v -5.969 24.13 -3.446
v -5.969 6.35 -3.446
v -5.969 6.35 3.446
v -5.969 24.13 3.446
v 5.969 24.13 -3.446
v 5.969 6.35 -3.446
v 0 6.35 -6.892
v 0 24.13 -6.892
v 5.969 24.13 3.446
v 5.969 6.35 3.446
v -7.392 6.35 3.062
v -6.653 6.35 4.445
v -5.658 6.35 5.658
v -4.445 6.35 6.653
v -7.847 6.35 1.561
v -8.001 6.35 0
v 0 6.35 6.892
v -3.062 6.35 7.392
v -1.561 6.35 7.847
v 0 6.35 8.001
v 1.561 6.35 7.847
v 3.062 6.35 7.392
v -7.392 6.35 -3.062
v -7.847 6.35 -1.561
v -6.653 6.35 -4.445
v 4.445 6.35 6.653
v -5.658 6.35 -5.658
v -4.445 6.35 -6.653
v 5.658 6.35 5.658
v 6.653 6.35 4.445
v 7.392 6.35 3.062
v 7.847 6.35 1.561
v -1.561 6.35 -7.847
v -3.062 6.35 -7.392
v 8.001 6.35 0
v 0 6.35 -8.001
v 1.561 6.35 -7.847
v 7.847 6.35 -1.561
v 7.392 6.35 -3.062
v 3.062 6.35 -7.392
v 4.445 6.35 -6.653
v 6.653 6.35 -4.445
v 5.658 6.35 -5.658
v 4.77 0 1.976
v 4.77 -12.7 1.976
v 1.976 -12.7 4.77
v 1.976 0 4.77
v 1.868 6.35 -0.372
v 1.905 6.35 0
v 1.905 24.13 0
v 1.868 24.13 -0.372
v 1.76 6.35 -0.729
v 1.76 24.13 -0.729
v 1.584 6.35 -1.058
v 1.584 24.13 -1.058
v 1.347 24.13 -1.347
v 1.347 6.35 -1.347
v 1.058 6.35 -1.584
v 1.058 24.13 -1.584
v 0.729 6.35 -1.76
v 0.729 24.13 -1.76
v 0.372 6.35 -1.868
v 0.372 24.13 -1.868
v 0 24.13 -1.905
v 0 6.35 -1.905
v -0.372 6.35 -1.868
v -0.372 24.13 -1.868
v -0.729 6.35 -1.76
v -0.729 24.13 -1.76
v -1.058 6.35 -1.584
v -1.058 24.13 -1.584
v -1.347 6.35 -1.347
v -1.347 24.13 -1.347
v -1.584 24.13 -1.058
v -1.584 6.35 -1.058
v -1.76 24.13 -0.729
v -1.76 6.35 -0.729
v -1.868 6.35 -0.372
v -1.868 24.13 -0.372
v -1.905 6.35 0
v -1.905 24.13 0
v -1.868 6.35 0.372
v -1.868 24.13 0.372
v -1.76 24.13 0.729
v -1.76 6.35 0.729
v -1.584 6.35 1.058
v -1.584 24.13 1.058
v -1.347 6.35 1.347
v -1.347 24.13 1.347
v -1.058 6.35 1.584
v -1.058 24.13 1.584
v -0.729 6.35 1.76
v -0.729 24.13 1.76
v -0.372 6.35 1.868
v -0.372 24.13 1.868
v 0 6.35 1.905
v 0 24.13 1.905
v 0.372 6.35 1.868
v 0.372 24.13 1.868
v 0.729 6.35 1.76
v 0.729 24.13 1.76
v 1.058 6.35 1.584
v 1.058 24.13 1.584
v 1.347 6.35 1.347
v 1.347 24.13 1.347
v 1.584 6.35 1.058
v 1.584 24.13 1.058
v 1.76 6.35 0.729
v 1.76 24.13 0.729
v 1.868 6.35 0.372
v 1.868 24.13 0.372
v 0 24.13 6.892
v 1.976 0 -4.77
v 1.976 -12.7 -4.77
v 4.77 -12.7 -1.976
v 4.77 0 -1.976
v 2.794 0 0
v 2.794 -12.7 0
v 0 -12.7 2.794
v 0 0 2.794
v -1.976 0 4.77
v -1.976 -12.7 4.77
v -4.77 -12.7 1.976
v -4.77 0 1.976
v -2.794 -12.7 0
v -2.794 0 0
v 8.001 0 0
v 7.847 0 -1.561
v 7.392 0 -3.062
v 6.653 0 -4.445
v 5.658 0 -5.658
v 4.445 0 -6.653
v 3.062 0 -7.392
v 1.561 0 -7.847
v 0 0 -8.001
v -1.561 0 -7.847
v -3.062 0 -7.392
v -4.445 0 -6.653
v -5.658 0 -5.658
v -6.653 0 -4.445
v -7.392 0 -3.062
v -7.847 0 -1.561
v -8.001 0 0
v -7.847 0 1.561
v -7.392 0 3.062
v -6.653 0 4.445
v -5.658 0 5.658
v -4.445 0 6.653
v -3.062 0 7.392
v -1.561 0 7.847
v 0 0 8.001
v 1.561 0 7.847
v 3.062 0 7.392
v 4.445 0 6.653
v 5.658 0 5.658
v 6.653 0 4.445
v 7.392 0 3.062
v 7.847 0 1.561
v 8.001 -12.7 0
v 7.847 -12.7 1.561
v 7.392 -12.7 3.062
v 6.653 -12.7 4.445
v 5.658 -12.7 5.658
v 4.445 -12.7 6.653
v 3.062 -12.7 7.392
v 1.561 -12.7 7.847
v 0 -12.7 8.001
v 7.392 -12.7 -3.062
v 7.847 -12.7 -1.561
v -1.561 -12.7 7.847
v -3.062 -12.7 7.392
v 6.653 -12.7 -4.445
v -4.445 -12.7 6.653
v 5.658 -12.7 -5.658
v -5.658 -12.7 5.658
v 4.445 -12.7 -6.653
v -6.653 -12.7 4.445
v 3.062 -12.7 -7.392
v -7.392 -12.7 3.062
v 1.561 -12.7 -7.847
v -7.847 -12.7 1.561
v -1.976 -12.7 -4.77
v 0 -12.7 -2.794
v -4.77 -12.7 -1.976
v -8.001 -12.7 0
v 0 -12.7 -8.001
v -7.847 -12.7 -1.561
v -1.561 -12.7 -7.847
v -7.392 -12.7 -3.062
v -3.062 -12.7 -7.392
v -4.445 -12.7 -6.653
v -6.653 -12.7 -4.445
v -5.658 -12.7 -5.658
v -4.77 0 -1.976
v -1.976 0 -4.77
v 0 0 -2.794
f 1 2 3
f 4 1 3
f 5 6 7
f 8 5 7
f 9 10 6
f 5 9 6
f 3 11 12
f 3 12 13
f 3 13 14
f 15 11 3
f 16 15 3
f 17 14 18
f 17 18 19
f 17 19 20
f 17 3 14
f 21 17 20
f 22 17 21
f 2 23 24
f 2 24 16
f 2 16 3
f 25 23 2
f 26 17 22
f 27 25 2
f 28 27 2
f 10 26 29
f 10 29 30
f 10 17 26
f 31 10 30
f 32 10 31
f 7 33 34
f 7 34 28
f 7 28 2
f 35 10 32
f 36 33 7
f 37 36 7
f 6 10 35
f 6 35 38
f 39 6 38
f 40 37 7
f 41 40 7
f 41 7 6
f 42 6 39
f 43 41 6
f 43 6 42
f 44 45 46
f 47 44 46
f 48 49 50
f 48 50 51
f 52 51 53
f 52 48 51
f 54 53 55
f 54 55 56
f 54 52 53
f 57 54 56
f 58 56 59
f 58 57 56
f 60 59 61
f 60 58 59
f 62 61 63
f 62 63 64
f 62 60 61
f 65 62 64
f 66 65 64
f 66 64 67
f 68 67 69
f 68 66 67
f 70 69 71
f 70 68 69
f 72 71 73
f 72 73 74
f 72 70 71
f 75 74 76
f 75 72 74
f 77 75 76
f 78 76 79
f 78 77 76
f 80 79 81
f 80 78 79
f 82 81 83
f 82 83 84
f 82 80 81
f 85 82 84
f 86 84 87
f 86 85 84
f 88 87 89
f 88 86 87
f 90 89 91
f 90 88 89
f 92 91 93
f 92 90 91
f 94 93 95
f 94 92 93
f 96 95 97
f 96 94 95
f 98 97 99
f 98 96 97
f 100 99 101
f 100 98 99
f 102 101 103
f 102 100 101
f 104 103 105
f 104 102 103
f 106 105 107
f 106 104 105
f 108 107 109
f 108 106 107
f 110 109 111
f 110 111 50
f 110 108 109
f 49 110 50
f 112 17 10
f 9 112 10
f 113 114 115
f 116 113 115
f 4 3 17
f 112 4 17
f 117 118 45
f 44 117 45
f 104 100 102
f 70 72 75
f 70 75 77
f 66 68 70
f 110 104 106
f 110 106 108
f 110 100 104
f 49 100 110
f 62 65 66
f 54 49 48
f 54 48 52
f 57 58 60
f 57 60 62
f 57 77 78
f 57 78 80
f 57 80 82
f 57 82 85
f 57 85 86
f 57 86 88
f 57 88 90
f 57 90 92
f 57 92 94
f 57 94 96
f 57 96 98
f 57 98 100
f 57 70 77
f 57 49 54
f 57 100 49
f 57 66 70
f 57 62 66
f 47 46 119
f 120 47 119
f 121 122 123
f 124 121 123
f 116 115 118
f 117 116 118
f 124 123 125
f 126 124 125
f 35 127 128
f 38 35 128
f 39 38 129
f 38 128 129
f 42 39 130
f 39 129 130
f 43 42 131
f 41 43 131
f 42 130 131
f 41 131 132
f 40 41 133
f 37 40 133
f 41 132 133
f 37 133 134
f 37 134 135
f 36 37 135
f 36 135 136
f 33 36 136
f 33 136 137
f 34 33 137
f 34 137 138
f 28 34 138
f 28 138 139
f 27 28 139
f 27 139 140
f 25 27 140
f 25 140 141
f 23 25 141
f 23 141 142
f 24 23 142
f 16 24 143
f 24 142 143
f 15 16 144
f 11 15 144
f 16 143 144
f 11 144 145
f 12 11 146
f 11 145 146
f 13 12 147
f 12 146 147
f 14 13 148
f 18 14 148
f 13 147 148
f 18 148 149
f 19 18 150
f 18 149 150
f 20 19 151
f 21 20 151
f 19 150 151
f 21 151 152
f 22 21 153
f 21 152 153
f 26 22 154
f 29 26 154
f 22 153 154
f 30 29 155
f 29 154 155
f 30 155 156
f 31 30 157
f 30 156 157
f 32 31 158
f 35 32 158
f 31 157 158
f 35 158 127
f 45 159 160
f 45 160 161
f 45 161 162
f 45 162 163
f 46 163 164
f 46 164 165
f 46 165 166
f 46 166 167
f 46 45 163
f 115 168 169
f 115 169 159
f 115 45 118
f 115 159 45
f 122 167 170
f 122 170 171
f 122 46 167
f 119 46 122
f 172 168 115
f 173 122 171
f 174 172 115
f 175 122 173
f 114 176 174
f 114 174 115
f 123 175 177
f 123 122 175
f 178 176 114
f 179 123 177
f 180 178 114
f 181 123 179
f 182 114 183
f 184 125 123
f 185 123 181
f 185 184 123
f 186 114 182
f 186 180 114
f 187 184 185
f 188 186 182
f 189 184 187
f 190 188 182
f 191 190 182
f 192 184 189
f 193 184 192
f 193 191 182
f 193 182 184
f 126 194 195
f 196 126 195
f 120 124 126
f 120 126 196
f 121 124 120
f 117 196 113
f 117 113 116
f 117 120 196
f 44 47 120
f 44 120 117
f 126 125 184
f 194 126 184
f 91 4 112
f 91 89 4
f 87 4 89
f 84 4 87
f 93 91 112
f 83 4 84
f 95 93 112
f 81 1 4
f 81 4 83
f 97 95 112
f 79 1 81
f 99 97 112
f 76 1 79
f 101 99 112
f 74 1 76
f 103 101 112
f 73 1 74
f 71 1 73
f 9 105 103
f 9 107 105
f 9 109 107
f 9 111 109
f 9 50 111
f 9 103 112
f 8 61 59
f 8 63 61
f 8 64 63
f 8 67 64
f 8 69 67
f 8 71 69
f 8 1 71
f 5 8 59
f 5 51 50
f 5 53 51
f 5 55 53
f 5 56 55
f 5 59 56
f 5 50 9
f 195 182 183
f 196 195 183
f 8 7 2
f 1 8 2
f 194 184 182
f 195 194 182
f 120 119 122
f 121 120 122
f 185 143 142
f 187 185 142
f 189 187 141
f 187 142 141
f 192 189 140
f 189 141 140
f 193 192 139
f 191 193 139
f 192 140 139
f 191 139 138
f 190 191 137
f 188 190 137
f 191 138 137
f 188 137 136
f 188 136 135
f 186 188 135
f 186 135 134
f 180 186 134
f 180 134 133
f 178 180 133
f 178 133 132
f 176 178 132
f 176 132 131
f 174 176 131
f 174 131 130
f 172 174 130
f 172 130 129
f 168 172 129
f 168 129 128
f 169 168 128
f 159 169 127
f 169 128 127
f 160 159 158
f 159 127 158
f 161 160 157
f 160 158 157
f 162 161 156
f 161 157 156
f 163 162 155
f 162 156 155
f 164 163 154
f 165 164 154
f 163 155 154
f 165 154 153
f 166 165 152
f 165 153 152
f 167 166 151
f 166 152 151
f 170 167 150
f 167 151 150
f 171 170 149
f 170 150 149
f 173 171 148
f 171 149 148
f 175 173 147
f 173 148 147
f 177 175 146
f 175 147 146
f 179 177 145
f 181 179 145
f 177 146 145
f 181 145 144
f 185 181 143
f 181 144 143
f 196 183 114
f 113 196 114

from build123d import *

# Parameters (mm, degrees)
SKETCH1_R           = 8.001
BOSS_EXTRUDE1_DEPTH = 6.35
SKETCH3_R           = 8.001
BOSS_EXTRUDE2_DEPTH = 12.7
CUT_EXTRUDE1_DEPTH  = 12.7
SKETCH11_R          = 1.905
BOSS_EXTRUDE5_DEPTH = 17.78


with BuildPart() as part:
    # Sketch1 → Boss-Extrude1 (new body)
    with BuildSketch(Plane(origin=(0, 0, 0), x_dir=(1, 0, 0), z_dir=(0, 1, 0))):
        Circle(SKETCH1_R)
    extrude(amount=BOSS_EXTRUDE1_DEPTH)

    # Sketch3 → Boss-Extrude2 (add)
    with BuildSketch(Plane(origin=(0, 0, 0), x_dir=(-1, 0, 0), z_dir=(0, -1, 0))):
        Circle(SKETCH3_R)
    extrude(amount=BOSS_EXTRUDE2_DEPTH)

    # Sketch4 → Cut-Extrude1 (cut)
    with BuildSketch(Plane.XZ.offset(12.7)):
        Polygon((8.54e-07, 2.793990901), (-1.975654462, 4.769648278), (-4.769655316, 1.975649132), (-2.794, -8.246e-06), (-4.769655493, -1.975665446), (-1.97565137, -4.769661323), (0, -2.794), (1.975656347, -4.769656347), (4.769656347, -1.975656347), (2.794, 0), (4.76965137, 1.975661323), (1.975647247, 4.7696572), align=None)
    extrude(amount=-CUT_EXTRUDE1_DEPTH, mode=Mode.SUBTRACT)

    # Sketch11 → Boss-Extrude5 (add)
    with BuildSketch(Plane(origin=(0, 6.35, 0), x_dir=(1, 0, 0), z_dir=(0, 1, 0))):
        Polygon((0, 6.892407514), (-5.969, 3.446203757), (-5.969, -3.446203757), (0, -6.892407514), (5.969, -3.446203757), (5.969, 3.446203757), align=None)
        Circle(SKETCH11_R, mode=Mode.SUBTRACT)
    extrude(amount=BOSS_EXTRUDE5_DEPTH)


solid = part.part
